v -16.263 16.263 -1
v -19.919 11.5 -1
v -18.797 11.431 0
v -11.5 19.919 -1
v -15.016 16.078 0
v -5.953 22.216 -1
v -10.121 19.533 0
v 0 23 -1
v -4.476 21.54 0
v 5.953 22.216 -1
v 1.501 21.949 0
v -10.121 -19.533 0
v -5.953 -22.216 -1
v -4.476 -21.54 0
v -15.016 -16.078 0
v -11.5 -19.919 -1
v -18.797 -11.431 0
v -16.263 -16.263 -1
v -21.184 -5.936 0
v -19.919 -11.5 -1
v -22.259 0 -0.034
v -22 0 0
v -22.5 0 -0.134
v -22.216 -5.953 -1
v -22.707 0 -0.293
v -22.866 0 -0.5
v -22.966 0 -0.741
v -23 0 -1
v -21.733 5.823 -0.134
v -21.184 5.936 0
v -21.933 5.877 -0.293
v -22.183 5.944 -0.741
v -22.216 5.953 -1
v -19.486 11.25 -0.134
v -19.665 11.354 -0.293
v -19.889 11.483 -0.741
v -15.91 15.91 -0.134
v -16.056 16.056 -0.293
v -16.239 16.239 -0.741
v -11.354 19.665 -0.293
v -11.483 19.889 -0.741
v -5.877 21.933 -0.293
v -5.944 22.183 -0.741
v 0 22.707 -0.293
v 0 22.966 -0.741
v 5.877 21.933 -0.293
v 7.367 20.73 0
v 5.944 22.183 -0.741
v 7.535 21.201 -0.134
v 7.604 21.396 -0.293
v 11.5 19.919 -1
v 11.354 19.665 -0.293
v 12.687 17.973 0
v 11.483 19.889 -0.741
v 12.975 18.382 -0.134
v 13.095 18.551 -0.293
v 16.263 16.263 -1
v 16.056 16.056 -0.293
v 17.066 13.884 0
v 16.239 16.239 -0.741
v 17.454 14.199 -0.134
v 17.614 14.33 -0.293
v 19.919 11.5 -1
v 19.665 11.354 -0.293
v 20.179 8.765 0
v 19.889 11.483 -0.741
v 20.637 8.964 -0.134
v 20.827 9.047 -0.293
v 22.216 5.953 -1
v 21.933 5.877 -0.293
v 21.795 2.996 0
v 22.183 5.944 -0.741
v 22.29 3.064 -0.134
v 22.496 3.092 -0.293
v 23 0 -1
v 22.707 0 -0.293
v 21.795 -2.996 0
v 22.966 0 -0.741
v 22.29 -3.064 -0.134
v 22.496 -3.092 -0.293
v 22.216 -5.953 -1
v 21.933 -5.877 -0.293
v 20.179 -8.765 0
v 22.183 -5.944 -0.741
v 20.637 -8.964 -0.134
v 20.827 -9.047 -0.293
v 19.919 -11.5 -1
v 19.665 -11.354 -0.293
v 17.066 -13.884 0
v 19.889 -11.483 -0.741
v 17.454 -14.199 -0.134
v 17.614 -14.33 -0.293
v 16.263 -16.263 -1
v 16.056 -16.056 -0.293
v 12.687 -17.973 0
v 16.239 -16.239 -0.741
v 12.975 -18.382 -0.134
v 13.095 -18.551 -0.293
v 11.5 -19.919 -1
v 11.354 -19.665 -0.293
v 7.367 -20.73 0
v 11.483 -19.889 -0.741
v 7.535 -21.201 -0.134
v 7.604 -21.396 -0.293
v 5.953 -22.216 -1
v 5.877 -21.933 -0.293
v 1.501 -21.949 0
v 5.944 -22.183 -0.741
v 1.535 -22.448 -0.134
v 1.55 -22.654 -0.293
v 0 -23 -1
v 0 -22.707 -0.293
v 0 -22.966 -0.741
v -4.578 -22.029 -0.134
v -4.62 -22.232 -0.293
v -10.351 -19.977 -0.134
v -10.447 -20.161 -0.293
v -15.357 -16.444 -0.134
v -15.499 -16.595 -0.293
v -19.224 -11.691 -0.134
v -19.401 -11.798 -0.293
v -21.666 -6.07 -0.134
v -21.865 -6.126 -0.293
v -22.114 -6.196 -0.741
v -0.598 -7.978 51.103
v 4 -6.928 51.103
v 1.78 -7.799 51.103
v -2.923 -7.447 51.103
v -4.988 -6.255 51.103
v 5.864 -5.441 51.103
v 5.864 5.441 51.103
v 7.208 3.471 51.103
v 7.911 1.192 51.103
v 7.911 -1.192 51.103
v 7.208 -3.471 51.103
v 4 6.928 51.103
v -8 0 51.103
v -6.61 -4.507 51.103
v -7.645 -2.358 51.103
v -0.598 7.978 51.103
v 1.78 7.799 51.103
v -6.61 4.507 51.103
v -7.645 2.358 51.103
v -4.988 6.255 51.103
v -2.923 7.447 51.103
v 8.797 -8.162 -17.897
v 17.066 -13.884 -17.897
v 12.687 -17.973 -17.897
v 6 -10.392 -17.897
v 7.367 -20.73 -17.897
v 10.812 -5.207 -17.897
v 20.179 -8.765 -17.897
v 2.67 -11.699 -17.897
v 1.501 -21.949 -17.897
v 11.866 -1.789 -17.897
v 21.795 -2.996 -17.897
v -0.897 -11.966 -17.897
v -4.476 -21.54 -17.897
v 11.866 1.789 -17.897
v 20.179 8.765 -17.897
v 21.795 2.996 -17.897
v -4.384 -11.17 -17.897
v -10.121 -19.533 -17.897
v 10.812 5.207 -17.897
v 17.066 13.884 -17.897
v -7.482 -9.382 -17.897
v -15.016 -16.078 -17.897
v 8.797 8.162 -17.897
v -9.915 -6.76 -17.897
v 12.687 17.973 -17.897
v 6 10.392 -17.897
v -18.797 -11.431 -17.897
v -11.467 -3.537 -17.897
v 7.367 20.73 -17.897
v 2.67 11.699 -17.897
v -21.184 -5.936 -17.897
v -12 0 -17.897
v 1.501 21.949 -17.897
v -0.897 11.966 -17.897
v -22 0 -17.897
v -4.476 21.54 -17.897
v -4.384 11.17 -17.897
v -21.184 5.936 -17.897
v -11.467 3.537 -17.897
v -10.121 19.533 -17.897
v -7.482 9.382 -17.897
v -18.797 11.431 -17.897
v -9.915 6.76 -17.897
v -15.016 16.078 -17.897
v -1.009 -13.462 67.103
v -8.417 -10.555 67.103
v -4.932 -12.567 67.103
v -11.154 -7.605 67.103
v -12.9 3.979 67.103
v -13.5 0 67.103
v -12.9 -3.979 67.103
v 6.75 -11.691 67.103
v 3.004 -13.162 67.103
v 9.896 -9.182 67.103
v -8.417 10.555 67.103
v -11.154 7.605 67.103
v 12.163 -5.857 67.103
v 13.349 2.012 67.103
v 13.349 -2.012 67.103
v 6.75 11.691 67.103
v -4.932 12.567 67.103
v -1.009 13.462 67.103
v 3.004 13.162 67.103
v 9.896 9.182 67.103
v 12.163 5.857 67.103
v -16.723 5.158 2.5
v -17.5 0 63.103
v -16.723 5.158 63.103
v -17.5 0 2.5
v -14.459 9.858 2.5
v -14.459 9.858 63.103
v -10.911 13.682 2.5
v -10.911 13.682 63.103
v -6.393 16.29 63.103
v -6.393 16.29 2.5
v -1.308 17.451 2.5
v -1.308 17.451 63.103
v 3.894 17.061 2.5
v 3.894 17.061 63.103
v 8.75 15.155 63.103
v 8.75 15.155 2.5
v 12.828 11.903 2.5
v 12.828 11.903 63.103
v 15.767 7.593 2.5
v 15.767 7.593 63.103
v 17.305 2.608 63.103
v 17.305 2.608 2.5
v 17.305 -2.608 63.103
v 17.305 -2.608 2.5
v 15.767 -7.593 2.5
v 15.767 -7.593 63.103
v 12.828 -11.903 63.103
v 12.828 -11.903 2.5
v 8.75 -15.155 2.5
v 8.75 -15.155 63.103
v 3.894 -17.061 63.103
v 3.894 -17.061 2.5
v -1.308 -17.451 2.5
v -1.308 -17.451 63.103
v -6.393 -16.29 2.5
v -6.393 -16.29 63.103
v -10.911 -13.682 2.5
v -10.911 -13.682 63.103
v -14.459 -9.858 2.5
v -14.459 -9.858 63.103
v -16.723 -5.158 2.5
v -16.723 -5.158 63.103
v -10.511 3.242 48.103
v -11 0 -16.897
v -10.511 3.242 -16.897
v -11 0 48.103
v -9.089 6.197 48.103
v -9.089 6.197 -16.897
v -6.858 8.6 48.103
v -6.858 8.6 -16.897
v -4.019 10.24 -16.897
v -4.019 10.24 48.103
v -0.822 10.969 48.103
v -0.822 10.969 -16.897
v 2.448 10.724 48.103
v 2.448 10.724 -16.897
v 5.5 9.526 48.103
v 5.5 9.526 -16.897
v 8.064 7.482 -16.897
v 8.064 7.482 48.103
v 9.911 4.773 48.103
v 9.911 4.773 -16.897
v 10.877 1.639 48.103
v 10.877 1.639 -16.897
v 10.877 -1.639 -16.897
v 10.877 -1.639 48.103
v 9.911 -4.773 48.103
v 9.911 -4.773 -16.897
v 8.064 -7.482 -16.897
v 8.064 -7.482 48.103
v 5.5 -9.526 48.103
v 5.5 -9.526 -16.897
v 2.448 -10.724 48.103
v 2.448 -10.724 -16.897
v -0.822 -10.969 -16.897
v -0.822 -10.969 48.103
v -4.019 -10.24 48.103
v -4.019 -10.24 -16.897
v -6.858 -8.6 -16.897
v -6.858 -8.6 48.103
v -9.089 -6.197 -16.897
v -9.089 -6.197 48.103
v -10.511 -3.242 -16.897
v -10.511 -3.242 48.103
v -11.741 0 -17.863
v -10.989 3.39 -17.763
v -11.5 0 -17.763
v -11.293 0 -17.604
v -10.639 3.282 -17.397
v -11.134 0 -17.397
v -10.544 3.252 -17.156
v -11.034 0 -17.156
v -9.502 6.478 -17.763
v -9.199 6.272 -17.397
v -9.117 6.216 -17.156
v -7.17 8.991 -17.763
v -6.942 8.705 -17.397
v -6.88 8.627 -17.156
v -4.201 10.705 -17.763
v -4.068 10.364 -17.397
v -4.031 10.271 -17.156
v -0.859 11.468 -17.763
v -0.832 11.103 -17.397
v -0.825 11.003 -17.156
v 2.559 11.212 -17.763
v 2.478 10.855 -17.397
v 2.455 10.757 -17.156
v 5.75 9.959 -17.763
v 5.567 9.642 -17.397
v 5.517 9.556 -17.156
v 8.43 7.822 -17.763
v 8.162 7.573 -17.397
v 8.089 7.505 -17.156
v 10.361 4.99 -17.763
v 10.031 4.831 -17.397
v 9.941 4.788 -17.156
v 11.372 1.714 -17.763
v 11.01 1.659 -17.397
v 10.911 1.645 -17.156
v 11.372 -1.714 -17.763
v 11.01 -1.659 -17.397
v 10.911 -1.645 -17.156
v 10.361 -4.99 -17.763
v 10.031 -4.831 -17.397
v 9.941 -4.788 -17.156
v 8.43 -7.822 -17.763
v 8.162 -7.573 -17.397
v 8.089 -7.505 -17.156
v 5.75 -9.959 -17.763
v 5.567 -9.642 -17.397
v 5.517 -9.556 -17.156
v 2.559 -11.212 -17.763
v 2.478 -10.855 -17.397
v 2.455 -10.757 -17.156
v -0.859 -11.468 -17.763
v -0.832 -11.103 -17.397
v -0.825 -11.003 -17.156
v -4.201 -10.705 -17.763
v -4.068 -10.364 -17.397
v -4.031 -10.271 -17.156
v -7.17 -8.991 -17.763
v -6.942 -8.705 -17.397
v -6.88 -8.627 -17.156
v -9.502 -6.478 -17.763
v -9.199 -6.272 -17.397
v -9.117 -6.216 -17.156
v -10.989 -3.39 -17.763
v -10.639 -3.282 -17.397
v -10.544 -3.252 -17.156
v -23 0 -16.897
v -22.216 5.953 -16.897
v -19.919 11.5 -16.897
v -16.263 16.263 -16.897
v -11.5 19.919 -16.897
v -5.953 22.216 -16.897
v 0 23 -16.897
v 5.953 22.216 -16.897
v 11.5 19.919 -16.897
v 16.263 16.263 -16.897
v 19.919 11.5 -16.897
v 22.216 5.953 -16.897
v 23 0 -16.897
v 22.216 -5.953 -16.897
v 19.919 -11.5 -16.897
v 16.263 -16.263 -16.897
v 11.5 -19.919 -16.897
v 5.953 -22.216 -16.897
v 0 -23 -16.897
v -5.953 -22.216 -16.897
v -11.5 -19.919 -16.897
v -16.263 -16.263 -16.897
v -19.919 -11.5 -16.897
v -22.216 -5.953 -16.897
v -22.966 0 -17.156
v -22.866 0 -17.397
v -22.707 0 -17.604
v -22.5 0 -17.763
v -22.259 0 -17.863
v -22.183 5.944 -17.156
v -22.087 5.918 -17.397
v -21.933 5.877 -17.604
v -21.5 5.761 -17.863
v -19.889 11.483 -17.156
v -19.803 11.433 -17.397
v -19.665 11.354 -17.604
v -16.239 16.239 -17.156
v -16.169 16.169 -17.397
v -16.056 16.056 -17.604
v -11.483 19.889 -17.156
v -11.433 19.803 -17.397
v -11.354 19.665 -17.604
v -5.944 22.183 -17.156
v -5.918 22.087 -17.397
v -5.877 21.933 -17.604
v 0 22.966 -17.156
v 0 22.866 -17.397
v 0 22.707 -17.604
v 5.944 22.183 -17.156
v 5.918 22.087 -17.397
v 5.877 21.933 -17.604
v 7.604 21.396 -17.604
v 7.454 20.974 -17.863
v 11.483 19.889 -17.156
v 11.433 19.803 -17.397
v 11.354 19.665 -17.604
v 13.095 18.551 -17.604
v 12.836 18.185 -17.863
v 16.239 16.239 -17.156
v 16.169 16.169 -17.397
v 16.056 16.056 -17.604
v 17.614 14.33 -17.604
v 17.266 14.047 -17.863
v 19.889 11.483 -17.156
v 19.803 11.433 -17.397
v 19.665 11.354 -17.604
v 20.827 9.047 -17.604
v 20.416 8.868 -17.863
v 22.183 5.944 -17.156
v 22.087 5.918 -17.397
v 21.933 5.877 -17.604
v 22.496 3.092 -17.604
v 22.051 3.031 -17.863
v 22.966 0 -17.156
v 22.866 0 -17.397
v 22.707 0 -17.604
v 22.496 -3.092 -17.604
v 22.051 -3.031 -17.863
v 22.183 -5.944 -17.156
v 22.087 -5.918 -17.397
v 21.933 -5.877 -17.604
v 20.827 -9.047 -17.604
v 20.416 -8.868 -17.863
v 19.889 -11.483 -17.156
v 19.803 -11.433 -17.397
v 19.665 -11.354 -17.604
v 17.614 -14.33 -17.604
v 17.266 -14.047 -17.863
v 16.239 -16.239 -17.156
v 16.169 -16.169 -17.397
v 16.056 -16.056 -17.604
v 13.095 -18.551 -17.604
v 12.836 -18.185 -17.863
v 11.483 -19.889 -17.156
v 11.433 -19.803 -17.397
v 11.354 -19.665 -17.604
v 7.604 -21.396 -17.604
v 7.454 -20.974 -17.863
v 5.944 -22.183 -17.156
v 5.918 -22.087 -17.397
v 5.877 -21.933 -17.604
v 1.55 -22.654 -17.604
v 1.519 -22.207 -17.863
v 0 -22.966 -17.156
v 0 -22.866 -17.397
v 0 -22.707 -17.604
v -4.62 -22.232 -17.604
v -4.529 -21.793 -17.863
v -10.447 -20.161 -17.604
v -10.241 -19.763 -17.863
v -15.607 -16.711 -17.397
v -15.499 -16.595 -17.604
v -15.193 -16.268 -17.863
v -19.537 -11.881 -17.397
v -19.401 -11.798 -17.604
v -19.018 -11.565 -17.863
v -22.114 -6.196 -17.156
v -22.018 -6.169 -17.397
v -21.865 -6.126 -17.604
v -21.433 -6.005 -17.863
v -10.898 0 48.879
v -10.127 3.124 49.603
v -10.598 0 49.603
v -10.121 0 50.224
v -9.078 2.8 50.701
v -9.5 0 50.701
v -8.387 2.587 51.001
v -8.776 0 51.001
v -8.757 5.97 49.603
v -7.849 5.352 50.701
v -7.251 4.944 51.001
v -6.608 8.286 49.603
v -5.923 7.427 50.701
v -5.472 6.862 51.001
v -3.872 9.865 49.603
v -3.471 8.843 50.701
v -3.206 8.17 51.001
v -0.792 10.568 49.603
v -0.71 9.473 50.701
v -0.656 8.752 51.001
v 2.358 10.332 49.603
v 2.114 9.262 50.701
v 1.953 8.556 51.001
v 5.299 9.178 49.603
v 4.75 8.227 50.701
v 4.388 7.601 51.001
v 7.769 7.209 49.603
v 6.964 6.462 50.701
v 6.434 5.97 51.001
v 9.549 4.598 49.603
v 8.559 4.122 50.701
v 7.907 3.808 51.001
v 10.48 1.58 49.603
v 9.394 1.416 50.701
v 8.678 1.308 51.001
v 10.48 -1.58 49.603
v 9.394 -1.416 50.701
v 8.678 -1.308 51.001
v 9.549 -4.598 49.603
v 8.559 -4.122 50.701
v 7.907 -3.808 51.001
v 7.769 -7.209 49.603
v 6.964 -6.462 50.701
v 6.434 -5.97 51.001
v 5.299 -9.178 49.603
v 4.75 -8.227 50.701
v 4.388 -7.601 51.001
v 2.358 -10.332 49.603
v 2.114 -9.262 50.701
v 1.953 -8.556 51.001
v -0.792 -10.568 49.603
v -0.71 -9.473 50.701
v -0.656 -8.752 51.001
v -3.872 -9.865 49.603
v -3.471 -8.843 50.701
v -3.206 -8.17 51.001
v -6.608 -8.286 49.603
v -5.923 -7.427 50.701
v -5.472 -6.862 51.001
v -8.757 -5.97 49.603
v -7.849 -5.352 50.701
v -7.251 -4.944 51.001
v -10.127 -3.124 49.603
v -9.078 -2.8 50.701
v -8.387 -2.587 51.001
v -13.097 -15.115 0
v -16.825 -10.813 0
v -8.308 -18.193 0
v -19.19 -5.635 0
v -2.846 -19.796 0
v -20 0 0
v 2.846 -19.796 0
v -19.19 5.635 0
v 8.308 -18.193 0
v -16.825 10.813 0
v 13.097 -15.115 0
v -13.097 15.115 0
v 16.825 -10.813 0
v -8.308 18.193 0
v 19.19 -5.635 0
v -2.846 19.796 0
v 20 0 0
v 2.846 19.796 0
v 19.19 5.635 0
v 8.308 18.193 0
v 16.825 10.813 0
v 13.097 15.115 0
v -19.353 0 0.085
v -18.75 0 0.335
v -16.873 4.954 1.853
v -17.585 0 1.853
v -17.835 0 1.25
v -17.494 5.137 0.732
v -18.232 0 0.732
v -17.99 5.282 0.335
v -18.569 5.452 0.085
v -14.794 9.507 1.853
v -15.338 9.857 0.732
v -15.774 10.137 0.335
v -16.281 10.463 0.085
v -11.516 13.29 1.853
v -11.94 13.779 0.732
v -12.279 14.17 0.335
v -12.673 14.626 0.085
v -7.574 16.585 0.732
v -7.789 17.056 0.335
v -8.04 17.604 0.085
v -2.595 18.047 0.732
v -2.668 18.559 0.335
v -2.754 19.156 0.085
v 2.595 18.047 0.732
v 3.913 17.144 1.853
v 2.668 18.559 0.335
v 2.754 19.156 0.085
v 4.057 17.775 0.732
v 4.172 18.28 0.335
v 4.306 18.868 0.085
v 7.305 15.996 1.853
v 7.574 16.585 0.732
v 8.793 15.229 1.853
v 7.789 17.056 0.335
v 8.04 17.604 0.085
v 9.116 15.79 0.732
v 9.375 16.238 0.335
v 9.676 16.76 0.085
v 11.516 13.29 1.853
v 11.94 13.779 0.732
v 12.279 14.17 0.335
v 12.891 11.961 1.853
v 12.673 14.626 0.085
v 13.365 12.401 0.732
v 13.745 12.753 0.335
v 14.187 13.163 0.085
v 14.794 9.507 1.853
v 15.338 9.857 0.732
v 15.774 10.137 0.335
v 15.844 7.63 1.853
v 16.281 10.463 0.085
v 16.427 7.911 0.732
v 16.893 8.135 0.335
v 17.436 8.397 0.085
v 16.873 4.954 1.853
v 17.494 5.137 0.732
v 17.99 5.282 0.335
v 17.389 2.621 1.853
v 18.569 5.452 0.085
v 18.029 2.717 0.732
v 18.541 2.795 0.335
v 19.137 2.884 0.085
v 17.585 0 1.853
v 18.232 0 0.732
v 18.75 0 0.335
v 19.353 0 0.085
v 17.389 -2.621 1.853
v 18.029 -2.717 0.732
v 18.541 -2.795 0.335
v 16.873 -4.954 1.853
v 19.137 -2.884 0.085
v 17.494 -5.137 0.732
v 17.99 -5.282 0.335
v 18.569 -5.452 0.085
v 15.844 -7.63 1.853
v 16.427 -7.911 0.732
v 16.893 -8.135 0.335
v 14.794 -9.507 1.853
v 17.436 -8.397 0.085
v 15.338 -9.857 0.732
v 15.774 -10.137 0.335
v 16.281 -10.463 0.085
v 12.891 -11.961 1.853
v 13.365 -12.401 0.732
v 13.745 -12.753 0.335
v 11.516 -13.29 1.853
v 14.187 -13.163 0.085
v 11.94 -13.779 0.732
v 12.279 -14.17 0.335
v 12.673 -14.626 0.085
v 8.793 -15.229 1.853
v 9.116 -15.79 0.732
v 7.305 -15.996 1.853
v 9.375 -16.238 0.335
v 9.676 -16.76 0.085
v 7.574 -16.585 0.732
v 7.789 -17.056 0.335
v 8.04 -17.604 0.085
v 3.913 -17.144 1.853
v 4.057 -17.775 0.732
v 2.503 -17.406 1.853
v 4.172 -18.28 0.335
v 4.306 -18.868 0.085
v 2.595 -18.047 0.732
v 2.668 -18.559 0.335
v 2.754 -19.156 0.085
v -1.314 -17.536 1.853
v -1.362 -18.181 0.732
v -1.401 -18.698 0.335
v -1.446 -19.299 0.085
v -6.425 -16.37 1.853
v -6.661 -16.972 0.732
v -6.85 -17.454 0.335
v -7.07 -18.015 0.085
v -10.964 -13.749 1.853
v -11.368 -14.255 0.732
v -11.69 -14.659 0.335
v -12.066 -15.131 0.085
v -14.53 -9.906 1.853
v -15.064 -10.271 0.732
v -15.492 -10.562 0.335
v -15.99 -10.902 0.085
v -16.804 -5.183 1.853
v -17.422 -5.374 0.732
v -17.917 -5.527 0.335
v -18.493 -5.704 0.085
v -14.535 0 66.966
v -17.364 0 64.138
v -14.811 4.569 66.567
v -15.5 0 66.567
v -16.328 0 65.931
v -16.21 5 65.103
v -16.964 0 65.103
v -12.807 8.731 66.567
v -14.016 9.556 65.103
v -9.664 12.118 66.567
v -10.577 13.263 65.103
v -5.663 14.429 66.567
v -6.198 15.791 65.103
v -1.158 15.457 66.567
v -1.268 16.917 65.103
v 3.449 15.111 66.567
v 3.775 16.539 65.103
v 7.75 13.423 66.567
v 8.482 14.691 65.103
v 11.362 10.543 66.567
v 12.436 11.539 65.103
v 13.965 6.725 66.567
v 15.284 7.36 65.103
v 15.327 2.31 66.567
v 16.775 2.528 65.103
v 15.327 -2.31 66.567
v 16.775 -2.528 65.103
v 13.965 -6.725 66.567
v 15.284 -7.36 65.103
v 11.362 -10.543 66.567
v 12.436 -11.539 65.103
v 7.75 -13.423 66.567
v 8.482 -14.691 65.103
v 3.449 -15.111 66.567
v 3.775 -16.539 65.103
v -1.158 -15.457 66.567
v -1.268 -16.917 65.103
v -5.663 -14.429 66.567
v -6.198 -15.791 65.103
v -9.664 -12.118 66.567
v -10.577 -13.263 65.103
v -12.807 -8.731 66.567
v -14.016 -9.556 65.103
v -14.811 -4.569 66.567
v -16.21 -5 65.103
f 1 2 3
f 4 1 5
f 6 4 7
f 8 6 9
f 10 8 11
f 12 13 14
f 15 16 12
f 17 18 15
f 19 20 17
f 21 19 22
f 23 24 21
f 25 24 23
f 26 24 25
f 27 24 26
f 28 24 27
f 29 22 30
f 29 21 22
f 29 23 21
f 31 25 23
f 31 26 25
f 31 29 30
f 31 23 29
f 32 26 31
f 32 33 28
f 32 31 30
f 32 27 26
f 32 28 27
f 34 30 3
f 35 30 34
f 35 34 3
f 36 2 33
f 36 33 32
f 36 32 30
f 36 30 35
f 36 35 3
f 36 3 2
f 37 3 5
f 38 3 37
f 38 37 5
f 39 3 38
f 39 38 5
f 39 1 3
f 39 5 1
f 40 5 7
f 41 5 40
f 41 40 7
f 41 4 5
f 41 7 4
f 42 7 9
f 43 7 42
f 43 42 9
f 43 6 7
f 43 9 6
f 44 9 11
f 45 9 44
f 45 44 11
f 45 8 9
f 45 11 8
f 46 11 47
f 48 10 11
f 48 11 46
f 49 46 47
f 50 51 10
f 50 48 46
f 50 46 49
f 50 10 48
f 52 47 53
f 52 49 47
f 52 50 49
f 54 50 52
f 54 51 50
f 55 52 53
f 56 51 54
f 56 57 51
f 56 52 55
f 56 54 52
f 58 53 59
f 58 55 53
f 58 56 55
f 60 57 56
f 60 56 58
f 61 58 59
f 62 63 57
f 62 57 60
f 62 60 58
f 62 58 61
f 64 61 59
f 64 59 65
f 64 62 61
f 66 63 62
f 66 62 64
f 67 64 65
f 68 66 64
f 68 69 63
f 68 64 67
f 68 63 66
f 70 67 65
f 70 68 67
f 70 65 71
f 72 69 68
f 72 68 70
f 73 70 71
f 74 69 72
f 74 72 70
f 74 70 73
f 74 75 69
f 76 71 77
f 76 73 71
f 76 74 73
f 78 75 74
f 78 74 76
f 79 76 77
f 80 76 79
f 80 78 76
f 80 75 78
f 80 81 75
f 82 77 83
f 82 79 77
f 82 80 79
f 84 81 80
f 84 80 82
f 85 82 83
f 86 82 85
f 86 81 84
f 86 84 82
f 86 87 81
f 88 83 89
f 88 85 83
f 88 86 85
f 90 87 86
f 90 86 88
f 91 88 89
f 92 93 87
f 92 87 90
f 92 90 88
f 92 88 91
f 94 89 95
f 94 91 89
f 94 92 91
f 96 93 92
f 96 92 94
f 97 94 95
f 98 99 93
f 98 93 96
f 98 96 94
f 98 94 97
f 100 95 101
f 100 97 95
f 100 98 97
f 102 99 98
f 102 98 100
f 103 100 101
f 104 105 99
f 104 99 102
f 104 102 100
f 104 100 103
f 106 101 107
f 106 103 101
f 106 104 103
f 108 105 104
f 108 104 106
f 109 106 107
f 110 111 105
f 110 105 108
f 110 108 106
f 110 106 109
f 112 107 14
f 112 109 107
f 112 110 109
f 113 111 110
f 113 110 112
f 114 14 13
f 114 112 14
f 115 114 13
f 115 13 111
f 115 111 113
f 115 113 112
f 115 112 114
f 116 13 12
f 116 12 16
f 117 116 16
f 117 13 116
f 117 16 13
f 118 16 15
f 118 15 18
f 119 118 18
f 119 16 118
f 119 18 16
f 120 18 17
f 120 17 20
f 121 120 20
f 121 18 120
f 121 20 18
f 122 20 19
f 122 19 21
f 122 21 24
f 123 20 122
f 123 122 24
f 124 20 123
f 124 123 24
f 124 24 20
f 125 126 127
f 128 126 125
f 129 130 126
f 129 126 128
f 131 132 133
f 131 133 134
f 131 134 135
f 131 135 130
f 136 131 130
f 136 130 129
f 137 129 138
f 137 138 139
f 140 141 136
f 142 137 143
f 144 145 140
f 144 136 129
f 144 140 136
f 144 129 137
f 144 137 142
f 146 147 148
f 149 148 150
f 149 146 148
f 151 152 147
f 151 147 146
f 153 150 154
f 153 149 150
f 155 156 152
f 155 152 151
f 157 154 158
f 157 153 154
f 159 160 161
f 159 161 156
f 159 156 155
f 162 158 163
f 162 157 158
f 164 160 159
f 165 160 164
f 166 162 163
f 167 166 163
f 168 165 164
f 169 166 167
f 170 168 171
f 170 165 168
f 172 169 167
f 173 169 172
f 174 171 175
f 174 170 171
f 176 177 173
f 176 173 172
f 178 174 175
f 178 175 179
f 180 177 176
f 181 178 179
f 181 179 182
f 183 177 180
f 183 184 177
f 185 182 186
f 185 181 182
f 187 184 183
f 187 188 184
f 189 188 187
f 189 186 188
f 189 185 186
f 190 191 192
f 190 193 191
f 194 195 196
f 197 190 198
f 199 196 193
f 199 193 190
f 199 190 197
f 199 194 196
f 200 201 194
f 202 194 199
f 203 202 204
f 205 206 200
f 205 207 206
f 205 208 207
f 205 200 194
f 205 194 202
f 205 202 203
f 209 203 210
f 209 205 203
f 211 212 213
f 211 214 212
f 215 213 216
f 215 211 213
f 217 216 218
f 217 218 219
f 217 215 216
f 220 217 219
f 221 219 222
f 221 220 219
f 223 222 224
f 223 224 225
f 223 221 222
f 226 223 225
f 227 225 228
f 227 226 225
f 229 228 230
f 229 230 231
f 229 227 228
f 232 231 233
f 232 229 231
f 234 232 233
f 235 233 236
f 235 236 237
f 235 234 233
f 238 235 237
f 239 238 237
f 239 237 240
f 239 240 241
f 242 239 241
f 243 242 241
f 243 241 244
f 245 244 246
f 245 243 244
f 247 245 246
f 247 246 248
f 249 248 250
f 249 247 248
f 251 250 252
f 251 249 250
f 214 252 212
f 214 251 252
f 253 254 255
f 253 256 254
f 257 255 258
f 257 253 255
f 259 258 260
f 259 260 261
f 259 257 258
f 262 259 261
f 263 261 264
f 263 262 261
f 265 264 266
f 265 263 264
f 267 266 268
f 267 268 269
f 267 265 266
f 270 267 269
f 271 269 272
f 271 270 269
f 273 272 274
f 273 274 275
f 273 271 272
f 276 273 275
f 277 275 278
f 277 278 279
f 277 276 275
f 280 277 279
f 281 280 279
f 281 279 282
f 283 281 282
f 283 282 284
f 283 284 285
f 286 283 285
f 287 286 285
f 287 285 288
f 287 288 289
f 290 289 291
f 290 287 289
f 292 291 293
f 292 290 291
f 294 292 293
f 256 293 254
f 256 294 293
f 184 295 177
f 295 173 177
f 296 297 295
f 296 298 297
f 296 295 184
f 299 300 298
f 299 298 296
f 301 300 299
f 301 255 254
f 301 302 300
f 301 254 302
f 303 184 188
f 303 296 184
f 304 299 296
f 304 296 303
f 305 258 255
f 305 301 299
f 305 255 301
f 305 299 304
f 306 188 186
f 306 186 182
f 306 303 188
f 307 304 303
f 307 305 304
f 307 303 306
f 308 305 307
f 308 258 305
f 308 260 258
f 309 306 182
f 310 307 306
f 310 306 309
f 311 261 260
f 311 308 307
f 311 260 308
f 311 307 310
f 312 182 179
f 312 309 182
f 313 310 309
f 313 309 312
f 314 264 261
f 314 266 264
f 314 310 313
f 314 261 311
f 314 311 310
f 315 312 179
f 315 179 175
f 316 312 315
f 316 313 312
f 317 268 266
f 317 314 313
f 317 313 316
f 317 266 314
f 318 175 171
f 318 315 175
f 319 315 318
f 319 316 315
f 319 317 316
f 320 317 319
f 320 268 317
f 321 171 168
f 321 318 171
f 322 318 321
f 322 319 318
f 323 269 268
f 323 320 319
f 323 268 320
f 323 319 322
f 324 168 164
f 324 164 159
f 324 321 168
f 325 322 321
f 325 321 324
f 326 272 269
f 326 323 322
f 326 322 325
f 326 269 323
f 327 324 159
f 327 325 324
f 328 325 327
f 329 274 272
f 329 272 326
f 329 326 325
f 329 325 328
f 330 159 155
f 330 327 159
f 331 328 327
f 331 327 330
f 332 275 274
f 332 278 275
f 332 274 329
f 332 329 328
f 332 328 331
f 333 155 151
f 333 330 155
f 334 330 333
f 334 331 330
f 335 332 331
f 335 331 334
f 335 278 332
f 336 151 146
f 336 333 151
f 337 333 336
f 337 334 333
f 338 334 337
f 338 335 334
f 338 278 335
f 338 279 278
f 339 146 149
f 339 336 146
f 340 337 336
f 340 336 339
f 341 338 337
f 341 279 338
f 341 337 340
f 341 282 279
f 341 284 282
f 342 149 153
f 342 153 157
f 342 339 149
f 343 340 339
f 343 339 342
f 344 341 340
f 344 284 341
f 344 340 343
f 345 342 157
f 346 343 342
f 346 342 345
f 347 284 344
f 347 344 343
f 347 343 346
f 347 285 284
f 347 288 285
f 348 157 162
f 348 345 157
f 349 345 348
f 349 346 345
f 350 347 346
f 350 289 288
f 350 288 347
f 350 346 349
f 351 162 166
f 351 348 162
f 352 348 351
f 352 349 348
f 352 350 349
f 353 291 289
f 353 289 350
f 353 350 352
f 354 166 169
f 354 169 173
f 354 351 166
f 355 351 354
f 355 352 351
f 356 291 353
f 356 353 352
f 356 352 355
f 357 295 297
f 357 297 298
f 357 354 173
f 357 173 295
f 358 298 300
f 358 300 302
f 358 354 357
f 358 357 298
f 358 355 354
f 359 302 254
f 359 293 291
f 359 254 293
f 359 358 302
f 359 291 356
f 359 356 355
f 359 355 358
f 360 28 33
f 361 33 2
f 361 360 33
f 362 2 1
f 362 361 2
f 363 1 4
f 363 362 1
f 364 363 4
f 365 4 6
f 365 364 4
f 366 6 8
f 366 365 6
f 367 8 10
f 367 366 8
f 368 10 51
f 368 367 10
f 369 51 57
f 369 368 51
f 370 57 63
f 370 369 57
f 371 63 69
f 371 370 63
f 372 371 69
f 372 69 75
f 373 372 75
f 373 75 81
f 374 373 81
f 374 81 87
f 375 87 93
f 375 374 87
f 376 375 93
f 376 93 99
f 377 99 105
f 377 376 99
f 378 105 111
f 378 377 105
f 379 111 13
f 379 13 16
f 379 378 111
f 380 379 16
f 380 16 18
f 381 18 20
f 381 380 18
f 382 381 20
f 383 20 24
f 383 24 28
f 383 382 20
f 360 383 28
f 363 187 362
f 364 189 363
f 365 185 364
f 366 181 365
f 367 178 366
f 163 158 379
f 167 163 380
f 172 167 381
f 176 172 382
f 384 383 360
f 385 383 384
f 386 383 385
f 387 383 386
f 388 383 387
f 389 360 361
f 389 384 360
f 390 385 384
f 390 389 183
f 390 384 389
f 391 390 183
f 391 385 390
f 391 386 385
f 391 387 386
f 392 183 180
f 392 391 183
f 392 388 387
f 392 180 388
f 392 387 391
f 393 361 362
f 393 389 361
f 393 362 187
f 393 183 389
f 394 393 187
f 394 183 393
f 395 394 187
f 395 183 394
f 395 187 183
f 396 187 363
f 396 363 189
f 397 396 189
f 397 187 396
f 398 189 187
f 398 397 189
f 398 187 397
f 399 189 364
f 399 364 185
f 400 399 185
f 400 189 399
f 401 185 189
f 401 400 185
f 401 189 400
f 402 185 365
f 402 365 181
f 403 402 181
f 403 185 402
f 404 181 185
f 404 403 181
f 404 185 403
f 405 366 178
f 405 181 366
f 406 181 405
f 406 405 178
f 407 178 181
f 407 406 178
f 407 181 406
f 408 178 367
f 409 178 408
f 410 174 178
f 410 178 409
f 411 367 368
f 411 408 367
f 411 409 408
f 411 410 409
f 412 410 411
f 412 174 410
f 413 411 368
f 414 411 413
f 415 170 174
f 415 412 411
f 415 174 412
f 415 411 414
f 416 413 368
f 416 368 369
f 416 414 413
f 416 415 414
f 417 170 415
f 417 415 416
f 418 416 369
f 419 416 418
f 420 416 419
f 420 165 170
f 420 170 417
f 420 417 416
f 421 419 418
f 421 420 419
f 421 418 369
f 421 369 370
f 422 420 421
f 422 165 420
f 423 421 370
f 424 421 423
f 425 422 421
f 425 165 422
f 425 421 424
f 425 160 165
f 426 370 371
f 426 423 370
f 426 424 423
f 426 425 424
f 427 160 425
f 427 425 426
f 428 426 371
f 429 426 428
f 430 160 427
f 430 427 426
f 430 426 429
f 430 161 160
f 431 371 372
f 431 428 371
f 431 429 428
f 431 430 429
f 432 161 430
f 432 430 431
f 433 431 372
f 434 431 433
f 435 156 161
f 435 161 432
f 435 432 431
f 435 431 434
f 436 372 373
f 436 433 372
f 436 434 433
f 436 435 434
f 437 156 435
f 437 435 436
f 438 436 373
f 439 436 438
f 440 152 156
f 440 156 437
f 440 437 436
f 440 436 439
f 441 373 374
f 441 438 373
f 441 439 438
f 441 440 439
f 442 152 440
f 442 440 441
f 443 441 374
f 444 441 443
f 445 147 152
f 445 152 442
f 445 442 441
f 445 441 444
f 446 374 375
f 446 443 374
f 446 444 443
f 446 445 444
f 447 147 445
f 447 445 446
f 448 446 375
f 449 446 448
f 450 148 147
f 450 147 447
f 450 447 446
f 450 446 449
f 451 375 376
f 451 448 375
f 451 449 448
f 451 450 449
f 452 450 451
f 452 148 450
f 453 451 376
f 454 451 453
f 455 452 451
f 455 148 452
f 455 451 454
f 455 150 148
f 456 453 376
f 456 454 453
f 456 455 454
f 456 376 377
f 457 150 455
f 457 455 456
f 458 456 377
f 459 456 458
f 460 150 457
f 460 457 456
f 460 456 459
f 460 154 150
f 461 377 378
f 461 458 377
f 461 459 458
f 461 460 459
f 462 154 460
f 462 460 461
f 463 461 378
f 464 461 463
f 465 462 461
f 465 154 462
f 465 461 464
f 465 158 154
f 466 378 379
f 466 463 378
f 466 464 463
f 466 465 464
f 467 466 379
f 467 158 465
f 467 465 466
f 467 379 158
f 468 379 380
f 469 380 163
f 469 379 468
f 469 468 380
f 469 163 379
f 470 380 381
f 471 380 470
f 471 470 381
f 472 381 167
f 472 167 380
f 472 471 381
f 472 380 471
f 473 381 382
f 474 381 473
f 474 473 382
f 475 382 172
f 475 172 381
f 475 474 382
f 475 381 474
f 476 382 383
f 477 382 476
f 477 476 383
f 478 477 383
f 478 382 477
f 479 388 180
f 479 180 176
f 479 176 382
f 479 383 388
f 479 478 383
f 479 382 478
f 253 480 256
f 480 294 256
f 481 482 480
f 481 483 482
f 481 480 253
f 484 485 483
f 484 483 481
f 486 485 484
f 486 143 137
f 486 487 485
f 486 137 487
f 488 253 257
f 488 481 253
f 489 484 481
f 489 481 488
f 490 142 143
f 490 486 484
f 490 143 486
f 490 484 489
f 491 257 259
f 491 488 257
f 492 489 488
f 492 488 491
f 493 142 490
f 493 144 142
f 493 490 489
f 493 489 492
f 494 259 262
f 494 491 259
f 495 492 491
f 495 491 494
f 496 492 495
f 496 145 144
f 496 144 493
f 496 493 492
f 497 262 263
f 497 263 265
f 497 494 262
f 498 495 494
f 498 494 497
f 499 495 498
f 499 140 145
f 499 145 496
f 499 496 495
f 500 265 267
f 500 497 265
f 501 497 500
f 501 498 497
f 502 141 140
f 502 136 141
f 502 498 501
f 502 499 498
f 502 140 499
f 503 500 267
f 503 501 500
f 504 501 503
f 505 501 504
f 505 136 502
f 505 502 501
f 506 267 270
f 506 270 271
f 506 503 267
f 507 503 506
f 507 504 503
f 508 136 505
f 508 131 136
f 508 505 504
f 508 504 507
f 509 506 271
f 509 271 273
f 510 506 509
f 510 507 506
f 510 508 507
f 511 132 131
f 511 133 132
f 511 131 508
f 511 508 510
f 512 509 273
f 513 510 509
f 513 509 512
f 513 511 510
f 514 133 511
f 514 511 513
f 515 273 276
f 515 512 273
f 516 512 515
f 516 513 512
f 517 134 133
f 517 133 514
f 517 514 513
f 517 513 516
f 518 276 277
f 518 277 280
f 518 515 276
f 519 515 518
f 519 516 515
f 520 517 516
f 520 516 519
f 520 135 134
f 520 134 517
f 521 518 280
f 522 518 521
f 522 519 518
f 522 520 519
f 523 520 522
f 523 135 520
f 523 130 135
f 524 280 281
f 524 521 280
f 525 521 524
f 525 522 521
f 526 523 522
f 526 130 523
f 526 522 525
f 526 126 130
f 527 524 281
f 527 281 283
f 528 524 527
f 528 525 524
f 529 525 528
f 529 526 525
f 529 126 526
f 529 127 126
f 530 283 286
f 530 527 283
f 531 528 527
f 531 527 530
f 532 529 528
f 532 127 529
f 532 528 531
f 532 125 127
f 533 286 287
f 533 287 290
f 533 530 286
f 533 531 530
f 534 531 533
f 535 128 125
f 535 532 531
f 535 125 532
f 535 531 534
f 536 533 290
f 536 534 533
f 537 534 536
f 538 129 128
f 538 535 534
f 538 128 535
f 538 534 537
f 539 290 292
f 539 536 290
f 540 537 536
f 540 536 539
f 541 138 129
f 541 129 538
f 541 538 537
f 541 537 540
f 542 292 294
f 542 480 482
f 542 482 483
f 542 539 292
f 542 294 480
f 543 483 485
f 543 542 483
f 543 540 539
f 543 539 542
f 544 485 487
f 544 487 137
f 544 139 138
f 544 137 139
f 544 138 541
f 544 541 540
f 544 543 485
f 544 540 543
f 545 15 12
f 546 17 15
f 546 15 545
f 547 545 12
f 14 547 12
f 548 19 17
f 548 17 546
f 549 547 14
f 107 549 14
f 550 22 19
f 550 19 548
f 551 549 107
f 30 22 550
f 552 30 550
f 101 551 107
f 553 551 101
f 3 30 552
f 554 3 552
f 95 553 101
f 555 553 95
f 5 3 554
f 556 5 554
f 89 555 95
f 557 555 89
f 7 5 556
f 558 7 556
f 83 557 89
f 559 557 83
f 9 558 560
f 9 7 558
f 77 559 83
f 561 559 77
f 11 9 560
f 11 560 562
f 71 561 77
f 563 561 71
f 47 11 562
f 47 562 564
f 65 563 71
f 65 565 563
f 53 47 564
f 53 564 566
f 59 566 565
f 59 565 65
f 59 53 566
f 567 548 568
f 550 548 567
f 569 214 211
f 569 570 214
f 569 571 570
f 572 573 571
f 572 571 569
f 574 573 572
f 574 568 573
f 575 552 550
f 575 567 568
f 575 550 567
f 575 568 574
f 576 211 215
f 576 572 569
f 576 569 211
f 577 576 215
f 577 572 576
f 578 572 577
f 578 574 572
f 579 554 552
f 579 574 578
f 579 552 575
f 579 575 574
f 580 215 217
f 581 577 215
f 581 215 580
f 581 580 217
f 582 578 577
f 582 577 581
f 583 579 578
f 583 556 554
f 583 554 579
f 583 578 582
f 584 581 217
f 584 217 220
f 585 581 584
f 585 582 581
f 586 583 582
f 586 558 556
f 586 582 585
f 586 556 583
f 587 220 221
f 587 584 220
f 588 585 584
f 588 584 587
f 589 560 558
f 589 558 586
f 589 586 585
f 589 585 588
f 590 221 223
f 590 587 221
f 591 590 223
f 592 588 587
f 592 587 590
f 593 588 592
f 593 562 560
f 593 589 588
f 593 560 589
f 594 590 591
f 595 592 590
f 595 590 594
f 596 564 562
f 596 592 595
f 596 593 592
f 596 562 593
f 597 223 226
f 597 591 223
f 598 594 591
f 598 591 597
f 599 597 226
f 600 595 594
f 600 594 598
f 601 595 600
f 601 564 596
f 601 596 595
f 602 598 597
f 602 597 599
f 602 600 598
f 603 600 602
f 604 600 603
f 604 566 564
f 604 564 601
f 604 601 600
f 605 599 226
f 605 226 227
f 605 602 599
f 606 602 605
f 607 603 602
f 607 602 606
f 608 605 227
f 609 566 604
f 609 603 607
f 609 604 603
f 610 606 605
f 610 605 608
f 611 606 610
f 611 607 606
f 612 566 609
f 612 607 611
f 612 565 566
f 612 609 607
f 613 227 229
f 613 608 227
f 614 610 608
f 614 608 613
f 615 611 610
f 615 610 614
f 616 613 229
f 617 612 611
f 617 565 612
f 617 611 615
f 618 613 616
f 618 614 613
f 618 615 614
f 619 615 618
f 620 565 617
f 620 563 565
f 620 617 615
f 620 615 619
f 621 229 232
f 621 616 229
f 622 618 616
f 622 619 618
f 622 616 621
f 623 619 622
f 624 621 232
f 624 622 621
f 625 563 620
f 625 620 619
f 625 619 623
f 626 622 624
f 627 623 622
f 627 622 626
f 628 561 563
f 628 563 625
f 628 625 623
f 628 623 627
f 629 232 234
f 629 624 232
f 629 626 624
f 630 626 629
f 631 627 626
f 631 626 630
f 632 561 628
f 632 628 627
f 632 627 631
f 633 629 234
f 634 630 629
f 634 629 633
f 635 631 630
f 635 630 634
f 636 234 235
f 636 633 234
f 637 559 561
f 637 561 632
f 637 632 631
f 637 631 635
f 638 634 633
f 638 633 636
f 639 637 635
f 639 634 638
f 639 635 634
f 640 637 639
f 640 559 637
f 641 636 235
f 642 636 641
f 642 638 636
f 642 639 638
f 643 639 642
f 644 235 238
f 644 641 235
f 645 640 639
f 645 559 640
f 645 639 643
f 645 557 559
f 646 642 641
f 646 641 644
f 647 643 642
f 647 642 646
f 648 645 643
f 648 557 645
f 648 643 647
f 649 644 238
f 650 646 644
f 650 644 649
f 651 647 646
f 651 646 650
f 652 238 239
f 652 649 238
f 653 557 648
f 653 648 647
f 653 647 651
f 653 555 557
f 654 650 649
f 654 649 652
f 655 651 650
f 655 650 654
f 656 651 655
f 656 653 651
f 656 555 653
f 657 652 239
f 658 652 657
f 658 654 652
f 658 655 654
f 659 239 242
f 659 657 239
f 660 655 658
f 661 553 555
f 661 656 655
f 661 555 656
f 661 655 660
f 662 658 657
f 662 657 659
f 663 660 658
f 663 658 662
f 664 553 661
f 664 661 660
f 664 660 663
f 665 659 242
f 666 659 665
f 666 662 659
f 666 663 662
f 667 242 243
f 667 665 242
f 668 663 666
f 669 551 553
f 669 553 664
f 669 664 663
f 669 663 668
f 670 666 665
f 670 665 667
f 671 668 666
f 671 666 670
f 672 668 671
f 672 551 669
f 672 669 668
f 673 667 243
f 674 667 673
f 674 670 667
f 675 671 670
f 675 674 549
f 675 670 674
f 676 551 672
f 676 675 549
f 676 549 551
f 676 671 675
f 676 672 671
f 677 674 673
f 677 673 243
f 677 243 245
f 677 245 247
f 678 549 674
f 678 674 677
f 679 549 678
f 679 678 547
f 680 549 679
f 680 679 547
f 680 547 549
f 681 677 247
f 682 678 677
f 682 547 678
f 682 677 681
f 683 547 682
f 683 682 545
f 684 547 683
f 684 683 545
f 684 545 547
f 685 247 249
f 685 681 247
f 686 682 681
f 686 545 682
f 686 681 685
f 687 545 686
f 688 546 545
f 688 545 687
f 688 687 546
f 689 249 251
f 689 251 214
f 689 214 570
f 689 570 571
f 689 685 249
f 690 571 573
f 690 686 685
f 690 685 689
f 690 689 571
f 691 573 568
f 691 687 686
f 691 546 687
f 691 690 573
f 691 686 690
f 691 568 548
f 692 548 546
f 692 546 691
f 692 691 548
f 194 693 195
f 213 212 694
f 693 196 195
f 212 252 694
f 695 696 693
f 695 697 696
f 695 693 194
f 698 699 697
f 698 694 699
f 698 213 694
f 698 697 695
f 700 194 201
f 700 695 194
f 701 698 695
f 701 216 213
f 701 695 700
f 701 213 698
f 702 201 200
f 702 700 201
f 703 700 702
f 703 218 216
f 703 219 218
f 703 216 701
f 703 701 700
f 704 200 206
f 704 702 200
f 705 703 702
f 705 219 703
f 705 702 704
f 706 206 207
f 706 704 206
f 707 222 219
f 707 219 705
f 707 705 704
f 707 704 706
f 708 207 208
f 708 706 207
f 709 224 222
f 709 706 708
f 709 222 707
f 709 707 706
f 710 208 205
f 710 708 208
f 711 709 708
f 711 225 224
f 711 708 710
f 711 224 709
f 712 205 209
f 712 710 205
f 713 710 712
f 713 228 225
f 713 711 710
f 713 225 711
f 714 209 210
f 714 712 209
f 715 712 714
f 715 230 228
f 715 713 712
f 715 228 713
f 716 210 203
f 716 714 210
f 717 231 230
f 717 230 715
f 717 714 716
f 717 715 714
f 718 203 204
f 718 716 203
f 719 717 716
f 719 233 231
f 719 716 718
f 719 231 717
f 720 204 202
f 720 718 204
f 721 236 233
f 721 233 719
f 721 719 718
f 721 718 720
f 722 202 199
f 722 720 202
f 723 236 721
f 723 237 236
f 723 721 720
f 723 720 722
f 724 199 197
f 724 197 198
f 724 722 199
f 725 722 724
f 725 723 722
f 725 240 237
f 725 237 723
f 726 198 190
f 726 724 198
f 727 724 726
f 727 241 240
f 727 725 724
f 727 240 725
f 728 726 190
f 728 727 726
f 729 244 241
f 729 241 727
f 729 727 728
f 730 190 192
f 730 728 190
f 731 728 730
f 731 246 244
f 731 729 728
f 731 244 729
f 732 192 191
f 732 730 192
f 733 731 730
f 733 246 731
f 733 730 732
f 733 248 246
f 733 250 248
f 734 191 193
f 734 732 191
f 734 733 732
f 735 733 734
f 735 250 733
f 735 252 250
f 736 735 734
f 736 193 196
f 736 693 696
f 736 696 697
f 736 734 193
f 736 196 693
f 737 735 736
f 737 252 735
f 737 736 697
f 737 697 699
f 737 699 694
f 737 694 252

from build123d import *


with BuildPart() as f1:
    # F0 (on Front) → F1 (revolve)
    with BuildSketch(Plane.XZ):
        with BuildLine():
            Line((-11, -16.897214), (-11, 0))
            Line((-11, 0), (-11, 48.102786))
            ThreePointArc((-11, 48.102786), (-10.12132, 50.224107), (-8, 51.102786))
            Line((-8, 51.102786), (0, 51.102786))
            Line((0, 51.102786), (0, 67.102786))
            Line((0, 67.102786), (-13.5, 67.102786))
            ThreePointArc((-13.5, 67.102786), (-16.328427, 65.931213), (-17.5, 63.102786))
            Line((-17.5, 63.102786), (-17.5, 52.102786))
            Line((-17.5, 52.102786), (-17.5, 2.5))
            ThreePointArc((-17.5, 2.5), (-18.232233, 0.732233), (-20, 0))
            Line((-20, 0), (-22, 0))
            ThreePointArc((-22, 0), (-22.707107, -0.292893), (-23, -1))
            Line((-23, -1), (-23, -16.897214))
            ThreePointArc((-23, -16.897214), (-22.707107, -17.604321), (-22, -17.897214))
            Line((-22, -17.897214), (-12, -17.897214))
            ThreePointArc((-12, -17.897214), (-11.292893, -17.604321), (-11, -16.897214))
        make_face()
    revolve(axis=Axis((0, 0, 9.518242), (0, 0, -1)))


solid = f1.part
